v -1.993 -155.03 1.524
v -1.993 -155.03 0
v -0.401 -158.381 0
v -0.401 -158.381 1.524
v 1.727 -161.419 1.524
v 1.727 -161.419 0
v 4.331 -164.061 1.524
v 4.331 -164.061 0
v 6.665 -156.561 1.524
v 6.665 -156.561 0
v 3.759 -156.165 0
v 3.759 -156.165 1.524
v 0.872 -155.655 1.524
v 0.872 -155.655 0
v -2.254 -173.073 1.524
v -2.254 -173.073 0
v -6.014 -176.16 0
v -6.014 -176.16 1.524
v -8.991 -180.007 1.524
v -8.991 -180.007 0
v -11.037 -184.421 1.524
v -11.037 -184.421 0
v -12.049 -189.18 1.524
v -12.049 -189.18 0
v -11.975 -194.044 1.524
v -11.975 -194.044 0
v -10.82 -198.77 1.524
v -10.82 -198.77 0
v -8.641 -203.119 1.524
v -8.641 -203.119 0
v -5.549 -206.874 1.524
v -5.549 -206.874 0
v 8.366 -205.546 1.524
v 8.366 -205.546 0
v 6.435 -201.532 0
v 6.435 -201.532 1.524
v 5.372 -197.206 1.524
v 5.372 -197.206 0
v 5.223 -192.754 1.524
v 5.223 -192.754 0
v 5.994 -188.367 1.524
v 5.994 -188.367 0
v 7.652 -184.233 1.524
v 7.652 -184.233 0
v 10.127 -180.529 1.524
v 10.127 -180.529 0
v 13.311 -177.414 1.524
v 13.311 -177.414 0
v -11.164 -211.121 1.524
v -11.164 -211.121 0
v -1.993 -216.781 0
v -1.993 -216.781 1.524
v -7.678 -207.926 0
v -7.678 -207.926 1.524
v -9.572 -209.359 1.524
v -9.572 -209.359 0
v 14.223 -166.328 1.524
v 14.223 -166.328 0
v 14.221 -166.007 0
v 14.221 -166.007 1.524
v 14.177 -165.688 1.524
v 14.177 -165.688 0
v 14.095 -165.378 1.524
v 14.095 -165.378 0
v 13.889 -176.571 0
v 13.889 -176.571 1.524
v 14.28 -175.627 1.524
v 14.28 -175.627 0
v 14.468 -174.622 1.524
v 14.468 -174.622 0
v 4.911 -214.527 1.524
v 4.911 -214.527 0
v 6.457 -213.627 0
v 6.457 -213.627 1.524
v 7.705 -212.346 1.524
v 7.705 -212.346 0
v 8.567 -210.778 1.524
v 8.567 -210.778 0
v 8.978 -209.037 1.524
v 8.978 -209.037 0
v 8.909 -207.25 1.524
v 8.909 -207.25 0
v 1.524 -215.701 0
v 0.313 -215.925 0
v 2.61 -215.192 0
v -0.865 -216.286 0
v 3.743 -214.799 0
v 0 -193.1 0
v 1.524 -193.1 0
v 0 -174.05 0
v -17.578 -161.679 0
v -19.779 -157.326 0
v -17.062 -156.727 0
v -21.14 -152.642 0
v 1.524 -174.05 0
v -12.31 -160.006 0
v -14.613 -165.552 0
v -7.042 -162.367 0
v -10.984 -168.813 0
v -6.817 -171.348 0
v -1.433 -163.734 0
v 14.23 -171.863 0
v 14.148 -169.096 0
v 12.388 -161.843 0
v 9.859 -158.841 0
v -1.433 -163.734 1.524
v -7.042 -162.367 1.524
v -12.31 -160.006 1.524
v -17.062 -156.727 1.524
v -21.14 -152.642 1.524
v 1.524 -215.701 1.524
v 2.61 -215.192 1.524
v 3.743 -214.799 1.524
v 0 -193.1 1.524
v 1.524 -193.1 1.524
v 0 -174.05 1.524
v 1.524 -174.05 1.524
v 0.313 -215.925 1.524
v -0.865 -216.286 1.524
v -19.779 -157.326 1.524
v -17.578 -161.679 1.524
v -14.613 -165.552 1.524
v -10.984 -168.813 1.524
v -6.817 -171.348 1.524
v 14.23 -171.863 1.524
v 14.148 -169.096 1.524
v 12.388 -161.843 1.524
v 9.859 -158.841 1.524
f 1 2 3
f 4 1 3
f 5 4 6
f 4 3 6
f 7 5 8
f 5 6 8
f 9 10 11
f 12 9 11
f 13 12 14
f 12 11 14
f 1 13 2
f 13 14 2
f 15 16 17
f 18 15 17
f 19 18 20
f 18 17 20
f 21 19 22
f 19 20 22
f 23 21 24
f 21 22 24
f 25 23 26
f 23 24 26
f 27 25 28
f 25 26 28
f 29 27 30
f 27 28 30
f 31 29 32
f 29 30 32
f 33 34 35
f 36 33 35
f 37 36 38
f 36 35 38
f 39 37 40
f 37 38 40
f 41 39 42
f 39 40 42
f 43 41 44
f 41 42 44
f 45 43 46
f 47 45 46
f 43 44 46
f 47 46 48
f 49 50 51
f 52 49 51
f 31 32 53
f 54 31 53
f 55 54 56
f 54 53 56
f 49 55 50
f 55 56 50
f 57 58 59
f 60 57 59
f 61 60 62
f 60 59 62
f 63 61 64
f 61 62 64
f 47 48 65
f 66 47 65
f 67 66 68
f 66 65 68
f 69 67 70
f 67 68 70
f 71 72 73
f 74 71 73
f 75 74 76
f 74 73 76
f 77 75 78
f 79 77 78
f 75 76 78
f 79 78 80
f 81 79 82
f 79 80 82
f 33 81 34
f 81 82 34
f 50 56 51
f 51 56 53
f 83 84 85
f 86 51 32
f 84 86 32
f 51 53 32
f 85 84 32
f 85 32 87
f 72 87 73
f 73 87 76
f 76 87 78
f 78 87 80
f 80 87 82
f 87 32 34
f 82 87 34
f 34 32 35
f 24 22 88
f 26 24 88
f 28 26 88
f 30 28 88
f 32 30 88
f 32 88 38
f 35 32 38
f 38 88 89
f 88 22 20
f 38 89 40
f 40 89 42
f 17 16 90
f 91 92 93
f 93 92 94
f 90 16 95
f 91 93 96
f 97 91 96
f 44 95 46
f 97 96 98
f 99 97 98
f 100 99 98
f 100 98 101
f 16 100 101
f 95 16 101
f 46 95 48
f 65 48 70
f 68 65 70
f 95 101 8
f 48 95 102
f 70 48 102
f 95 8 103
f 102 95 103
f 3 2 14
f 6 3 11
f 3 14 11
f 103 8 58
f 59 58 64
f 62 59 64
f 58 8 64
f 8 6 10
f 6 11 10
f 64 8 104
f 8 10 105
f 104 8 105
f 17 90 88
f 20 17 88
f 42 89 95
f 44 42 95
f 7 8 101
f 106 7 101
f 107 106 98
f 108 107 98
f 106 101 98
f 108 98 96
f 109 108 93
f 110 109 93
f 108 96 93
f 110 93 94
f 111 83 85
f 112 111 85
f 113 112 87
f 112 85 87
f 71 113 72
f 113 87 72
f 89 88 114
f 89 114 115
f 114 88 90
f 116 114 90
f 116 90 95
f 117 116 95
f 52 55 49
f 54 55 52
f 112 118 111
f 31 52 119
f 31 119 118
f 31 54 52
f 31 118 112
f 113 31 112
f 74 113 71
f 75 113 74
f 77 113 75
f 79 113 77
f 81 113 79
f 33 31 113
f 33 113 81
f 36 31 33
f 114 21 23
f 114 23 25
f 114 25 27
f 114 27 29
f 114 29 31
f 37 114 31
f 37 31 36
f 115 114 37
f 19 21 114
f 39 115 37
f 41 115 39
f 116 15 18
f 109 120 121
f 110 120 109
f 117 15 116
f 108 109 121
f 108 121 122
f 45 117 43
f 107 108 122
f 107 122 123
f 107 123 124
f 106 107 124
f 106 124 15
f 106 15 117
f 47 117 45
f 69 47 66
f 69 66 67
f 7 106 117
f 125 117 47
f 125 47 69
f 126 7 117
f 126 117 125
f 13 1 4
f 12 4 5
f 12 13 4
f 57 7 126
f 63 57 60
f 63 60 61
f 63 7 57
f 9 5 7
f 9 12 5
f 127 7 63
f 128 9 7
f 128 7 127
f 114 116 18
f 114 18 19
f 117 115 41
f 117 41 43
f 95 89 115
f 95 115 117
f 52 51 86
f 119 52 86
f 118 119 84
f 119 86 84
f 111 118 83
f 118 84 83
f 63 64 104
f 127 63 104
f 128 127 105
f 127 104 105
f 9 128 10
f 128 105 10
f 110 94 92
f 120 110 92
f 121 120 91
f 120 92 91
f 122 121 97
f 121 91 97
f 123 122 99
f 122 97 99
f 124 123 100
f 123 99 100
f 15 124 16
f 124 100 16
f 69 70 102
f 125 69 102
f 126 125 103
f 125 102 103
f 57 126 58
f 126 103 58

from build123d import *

# Parameters (mm, degrees)
SKETCH1_W           = 1.524
SKETCH1_H           = 19.05
BOSS_EXTRUDE1_DEPTH = 1.524


with BuildPart() as part:
    # Sketch1 → Boss-Extrude1 (new body)
    with BuildSketch(Plane.XY):
        with BuildLine():
            Line((-11.16363506, -211.120891743), (-1.992949981, -216.780601905))
            ThreePointArc((-1.992949981, -216.780601905), (-0.281103266, -216.088759304), (1.524, -215.700600116))
            ThreePointArc((1.524, -215.700600116), (3.171388391, -214.980453866), (4.911266579, -214.527328034))
            ThreePointArc((4.911266579, -214.527328034), (8.56652215, -210.778134694), (8.366250568, -205.545808702))
            ThreePointArc((8.366250568, -205.545808702), (5.494506116, -190.54054727), (13.311403321, -177.414203341))
            ThreePointArc((13.311403321, -177.414203341), (14.109075531, -176.108897248), (14.468404268, -174.621958174))
            ThreePointArc((14.468404268, -174.621958174), (14.169609027, -170.480156419), (14.223154403, -166.327936138))
            ThreePointArc((14.223154403, -166.327936138), (14.204082667, -165.84665661), (14.094500503, -165.377630529))
            ThreePointArc((14.094500503, -165.377630529), (11.21769373, -160.262840376), (6.664633993, -156.56057856))
            ThreePointArc((6.664633993, -156.56057856), (2.313026504, -155.924450691), (-1.992949981, -155.030183999))
            ThreePointArc((-1.992949981, -155.030183999), (0.599102478, -159.944431448), (4.330540862, -164.060853624))
            ThreePointArc((4.330540862, -164.060853624), (-9.729681531, -161.306709082), (-21.139761832, -152.641535487))
            ThreePointArc((-21.139761832, -152.641535487), (-14.612667937, -165.552248896), (-2.254215141, -173.07276217))
            ThreePointArc((-2.254215141, -173.07276217), (-12.048739338, -189.17955679), (-5.548621032, -206.874471292))
            ThreePointArc((-5.548621032, -206.874471292), (-8.65863408, -208.597679765), (-11.16363506, -211.120891743))
        make_face()
        with Locations((0.762, -183.574694423)):
            Rectangle(SKETCH1_W, SKETCH1_H, mode=Mode.SUBTRACT)
    extrude(amount=BOSS_EXTRUDE1_DEPTH)


solid = part.part
